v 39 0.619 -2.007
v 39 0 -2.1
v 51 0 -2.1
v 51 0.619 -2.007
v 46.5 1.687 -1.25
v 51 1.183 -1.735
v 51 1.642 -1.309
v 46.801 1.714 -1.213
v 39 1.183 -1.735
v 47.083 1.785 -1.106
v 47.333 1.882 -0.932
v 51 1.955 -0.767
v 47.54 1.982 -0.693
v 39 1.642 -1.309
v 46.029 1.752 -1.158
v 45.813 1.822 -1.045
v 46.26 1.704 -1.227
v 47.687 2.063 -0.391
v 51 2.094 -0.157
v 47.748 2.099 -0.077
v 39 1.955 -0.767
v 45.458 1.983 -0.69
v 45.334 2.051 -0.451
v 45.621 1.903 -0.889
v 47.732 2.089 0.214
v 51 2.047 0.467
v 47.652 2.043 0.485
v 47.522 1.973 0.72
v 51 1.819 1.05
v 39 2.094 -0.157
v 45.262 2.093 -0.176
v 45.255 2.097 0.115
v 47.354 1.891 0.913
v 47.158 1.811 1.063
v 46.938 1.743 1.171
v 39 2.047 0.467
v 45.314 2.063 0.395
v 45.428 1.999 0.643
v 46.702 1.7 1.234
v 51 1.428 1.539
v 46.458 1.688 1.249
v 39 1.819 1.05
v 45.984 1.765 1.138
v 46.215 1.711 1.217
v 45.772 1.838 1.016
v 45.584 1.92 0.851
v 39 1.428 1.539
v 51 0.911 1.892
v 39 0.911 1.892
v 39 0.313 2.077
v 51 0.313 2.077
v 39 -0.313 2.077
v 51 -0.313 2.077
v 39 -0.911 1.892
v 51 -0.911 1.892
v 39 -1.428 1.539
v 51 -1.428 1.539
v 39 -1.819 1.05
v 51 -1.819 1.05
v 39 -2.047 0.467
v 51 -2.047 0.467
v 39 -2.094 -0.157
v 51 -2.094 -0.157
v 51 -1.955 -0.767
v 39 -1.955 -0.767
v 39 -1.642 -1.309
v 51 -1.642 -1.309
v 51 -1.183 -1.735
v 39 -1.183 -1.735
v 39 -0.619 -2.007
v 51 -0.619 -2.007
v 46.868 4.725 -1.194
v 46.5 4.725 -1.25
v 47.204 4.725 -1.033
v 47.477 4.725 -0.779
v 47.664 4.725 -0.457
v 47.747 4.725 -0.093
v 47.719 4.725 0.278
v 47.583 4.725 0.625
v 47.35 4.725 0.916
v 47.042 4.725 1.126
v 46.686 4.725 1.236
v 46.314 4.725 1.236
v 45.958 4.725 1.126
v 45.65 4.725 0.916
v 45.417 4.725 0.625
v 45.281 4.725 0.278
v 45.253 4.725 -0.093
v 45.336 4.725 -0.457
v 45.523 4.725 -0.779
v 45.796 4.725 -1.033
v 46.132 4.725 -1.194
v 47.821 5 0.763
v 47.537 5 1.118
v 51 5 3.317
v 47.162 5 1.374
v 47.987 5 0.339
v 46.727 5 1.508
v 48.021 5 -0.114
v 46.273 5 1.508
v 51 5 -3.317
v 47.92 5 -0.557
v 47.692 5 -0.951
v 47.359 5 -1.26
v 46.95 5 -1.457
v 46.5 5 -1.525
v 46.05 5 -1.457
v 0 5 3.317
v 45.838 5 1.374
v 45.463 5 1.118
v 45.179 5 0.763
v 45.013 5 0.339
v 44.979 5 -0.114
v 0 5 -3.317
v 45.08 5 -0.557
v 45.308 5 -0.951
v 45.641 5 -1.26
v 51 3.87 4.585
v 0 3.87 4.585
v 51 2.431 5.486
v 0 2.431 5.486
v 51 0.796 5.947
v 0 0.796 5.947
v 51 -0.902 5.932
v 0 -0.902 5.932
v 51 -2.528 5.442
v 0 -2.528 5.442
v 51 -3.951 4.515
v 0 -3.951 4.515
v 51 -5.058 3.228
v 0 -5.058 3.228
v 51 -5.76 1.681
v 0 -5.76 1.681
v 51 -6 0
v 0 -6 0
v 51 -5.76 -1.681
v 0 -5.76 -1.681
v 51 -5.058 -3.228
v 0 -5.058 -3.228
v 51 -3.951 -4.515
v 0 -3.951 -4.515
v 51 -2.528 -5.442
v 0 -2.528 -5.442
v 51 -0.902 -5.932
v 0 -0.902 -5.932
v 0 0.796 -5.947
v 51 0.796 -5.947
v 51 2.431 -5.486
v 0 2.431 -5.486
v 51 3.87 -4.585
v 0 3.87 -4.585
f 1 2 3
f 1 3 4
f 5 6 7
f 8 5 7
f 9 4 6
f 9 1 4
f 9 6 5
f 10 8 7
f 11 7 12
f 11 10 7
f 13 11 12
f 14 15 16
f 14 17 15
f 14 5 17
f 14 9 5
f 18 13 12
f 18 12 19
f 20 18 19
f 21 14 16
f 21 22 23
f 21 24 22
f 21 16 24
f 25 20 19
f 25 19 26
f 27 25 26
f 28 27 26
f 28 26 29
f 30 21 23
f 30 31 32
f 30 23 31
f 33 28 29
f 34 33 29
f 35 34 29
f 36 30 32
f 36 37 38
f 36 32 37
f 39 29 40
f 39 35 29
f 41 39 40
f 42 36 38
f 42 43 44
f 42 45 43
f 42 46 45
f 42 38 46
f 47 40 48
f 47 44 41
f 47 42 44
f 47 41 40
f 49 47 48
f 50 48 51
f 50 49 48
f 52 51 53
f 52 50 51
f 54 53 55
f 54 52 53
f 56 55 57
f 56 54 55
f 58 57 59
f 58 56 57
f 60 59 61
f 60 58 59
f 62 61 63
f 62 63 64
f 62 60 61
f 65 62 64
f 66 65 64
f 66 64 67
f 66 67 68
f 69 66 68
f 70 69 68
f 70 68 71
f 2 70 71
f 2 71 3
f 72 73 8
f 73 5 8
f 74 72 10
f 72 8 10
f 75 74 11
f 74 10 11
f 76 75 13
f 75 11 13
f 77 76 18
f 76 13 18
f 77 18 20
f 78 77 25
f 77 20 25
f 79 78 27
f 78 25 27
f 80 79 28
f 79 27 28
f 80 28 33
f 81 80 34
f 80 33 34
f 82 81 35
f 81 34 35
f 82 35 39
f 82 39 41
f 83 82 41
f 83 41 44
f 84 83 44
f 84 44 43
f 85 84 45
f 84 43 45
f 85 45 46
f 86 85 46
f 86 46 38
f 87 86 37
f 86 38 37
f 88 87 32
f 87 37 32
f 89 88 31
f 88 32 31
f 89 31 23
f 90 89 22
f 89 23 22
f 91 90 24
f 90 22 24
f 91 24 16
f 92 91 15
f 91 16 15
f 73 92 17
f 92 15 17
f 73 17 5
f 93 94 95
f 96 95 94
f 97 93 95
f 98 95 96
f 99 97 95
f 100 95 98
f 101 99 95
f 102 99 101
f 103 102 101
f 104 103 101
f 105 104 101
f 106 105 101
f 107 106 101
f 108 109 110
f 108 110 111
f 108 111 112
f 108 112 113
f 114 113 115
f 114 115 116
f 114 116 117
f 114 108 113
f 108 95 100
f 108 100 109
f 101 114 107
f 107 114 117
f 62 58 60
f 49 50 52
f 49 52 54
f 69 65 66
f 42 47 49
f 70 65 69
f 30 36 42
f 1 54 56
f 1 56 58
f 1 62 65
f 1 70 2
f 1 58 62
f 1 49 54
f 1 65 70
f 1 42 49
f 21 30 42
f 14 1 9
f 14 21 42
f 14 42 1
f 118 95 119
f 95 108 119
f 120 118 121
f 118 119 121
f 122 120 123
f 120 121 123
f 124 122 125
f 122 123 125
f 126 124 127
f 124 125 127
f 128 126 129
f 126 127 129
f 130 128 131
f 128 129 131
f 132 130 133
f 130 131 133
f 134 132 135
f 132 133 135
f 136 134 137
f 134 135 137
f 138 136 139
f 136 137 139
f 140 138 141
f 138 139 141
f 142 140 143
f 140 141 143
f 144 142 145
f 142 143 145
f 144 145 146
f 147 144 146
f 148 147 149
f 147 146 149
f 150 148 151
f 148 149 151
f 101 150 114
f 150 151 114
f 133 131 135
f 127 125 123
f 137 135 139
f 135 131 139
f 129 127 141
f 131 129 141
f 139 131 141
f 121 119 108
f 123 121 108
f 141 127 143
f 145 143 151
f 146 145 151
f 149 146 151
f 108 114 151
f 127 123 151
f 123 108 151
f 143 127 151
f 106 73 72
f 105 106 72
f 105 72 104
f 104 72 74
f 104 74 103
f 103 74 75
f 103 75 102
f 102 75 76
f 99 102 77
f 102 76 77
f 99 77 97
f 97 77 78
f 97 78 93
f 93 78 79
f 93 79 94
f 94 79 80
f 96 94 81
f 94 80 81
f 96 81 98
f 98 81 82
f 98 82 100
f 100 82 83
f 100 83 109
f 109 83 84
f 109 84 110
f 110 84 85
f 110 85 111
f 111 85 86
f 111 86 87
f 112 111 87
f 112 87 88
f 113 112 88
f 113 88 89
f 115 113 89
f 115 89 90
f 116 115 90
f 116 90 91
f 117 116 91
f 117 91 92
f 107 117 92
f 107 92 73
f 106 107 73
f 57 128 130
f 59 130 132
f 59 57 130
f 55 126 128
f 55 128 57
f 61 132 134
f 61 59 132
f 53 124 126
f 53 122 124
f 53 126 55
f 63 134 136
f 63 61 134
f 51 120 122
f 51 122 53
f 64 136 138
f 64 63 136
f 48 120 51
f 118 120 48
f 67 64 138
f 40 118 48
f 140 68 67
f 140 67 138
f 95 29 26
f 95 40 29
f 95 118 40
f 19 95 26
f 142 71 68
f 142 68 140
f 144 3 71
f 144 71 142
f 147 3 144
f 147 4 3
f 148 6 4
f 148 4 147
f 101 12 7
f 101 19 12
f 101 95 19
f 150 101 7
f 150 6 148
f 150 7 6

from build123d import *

# Parameters (mm, degrees)
SKETCH1_R                   = 6
BOSS_EXTRUDE1_DEPTH         = 51
CUT_EXTRUDE1_START          = -12
SKETCH2_R                   = 2.1
CUT_EXTRUDE1_DEPTH          = 12
M3_TAPPED_HOLE1_D           = 2.5
M3_TAPPED_HOLE1_DEPTH       = 6
M3_TAPPED_HOLE1_CSINK_D     = 3.05
M3_TAPPED_HOLE1_CSINK_ANGLE = 90
M3_TAPPED_HOLE1_TIP         = 0.751075774
CUT_EXTRUDE2_REACH          = 41.912


with BuildPart() as part:
    # Sketch1 → Boss-Extrude1 (new body)
    with BuildSketch(Plane(origin=(0, 0, 0), x_dir=(0, 0, -1), z_dir=(1, 0, 0))):
        Circle(SKETCH1_R)
    extrude(amount=BOSS_EXTRUDE1_DEPTH)

    # Sketch2 → Cut-Extrude1 (cut)
    with BuildSketch(Plane(origin=(51, 0, 0), x_dir=(0, 0, -1), z_dir=(1, 0, 0)).offset(CUT_EXTRUDE1_START)):
        Circle(SKETCH2_R)
        with BuildLine():
            Line((-3.31662479, 5), (3.31662479, 5))
            ThreePointArc((3.31662479, 5), (0, 6), (-3.31662479, 5))
        make_face()
    extrude(amount=CUT_EXTRUDE1_DEPTH, mode=Mode.SUBTRACT)

    # M3 Tapped Hole1
    with Locations(Plane(origin=(46.5, 5, 0), x_dir=(0, 0, 1), z_dir=(0, 1, 0))):
        with Locations((0, 0)):
            CounterSinkHole(M3_TAPPED_HOLE1_D / 2, M3_TAPPED_HOLE1_CSINK_D / 2, depth=M3_TAPPED_HOLE1_DEPTH, counter_sink_angle=M3_TAPPED_HOLE1_CSINK_ANGLE)
            with Locations((0, 0, -(M3_TAPPED_HOLE1_DEPTH + M3_TAPPED_HOLE1_TIP / 2))):  # 118° drill point
                Cone(0, M3_TAPPED_HOLE1_D / 2, M3_TAPPED_HOLE1_TIP, mode=Mode.SUBTRACT)

    # Sketch7 → Cut-Extrude2 (cut, up to next)
    with BuildSketch(Plane(origin=(39, 0, 0), x_dir=(0, 0, -1), z_dir=(1, 0, 0)), mode=Mode.PRIVATE) as cut_extrude2_sk1:
        with BuildLine():
            Line((-3.31662479, 5), (3.31662479, 5))
            ThreePointArc((3.31662479, 5), (0, 6), (-3.31662479, 5))
        make_face()
    cut_extrude2_tool1 = extrude(cut_extrude2_sk1.sketch, amount=-CUT_EXTRUDE2_REACH, mode=Mode.PRIVATE) & part.part
    add(cut_extrude2_tool1.solids().sort_by_distance((39, 5.403002, 0))[0], mode=Mode.SUBTRACT)


solid = part.part
